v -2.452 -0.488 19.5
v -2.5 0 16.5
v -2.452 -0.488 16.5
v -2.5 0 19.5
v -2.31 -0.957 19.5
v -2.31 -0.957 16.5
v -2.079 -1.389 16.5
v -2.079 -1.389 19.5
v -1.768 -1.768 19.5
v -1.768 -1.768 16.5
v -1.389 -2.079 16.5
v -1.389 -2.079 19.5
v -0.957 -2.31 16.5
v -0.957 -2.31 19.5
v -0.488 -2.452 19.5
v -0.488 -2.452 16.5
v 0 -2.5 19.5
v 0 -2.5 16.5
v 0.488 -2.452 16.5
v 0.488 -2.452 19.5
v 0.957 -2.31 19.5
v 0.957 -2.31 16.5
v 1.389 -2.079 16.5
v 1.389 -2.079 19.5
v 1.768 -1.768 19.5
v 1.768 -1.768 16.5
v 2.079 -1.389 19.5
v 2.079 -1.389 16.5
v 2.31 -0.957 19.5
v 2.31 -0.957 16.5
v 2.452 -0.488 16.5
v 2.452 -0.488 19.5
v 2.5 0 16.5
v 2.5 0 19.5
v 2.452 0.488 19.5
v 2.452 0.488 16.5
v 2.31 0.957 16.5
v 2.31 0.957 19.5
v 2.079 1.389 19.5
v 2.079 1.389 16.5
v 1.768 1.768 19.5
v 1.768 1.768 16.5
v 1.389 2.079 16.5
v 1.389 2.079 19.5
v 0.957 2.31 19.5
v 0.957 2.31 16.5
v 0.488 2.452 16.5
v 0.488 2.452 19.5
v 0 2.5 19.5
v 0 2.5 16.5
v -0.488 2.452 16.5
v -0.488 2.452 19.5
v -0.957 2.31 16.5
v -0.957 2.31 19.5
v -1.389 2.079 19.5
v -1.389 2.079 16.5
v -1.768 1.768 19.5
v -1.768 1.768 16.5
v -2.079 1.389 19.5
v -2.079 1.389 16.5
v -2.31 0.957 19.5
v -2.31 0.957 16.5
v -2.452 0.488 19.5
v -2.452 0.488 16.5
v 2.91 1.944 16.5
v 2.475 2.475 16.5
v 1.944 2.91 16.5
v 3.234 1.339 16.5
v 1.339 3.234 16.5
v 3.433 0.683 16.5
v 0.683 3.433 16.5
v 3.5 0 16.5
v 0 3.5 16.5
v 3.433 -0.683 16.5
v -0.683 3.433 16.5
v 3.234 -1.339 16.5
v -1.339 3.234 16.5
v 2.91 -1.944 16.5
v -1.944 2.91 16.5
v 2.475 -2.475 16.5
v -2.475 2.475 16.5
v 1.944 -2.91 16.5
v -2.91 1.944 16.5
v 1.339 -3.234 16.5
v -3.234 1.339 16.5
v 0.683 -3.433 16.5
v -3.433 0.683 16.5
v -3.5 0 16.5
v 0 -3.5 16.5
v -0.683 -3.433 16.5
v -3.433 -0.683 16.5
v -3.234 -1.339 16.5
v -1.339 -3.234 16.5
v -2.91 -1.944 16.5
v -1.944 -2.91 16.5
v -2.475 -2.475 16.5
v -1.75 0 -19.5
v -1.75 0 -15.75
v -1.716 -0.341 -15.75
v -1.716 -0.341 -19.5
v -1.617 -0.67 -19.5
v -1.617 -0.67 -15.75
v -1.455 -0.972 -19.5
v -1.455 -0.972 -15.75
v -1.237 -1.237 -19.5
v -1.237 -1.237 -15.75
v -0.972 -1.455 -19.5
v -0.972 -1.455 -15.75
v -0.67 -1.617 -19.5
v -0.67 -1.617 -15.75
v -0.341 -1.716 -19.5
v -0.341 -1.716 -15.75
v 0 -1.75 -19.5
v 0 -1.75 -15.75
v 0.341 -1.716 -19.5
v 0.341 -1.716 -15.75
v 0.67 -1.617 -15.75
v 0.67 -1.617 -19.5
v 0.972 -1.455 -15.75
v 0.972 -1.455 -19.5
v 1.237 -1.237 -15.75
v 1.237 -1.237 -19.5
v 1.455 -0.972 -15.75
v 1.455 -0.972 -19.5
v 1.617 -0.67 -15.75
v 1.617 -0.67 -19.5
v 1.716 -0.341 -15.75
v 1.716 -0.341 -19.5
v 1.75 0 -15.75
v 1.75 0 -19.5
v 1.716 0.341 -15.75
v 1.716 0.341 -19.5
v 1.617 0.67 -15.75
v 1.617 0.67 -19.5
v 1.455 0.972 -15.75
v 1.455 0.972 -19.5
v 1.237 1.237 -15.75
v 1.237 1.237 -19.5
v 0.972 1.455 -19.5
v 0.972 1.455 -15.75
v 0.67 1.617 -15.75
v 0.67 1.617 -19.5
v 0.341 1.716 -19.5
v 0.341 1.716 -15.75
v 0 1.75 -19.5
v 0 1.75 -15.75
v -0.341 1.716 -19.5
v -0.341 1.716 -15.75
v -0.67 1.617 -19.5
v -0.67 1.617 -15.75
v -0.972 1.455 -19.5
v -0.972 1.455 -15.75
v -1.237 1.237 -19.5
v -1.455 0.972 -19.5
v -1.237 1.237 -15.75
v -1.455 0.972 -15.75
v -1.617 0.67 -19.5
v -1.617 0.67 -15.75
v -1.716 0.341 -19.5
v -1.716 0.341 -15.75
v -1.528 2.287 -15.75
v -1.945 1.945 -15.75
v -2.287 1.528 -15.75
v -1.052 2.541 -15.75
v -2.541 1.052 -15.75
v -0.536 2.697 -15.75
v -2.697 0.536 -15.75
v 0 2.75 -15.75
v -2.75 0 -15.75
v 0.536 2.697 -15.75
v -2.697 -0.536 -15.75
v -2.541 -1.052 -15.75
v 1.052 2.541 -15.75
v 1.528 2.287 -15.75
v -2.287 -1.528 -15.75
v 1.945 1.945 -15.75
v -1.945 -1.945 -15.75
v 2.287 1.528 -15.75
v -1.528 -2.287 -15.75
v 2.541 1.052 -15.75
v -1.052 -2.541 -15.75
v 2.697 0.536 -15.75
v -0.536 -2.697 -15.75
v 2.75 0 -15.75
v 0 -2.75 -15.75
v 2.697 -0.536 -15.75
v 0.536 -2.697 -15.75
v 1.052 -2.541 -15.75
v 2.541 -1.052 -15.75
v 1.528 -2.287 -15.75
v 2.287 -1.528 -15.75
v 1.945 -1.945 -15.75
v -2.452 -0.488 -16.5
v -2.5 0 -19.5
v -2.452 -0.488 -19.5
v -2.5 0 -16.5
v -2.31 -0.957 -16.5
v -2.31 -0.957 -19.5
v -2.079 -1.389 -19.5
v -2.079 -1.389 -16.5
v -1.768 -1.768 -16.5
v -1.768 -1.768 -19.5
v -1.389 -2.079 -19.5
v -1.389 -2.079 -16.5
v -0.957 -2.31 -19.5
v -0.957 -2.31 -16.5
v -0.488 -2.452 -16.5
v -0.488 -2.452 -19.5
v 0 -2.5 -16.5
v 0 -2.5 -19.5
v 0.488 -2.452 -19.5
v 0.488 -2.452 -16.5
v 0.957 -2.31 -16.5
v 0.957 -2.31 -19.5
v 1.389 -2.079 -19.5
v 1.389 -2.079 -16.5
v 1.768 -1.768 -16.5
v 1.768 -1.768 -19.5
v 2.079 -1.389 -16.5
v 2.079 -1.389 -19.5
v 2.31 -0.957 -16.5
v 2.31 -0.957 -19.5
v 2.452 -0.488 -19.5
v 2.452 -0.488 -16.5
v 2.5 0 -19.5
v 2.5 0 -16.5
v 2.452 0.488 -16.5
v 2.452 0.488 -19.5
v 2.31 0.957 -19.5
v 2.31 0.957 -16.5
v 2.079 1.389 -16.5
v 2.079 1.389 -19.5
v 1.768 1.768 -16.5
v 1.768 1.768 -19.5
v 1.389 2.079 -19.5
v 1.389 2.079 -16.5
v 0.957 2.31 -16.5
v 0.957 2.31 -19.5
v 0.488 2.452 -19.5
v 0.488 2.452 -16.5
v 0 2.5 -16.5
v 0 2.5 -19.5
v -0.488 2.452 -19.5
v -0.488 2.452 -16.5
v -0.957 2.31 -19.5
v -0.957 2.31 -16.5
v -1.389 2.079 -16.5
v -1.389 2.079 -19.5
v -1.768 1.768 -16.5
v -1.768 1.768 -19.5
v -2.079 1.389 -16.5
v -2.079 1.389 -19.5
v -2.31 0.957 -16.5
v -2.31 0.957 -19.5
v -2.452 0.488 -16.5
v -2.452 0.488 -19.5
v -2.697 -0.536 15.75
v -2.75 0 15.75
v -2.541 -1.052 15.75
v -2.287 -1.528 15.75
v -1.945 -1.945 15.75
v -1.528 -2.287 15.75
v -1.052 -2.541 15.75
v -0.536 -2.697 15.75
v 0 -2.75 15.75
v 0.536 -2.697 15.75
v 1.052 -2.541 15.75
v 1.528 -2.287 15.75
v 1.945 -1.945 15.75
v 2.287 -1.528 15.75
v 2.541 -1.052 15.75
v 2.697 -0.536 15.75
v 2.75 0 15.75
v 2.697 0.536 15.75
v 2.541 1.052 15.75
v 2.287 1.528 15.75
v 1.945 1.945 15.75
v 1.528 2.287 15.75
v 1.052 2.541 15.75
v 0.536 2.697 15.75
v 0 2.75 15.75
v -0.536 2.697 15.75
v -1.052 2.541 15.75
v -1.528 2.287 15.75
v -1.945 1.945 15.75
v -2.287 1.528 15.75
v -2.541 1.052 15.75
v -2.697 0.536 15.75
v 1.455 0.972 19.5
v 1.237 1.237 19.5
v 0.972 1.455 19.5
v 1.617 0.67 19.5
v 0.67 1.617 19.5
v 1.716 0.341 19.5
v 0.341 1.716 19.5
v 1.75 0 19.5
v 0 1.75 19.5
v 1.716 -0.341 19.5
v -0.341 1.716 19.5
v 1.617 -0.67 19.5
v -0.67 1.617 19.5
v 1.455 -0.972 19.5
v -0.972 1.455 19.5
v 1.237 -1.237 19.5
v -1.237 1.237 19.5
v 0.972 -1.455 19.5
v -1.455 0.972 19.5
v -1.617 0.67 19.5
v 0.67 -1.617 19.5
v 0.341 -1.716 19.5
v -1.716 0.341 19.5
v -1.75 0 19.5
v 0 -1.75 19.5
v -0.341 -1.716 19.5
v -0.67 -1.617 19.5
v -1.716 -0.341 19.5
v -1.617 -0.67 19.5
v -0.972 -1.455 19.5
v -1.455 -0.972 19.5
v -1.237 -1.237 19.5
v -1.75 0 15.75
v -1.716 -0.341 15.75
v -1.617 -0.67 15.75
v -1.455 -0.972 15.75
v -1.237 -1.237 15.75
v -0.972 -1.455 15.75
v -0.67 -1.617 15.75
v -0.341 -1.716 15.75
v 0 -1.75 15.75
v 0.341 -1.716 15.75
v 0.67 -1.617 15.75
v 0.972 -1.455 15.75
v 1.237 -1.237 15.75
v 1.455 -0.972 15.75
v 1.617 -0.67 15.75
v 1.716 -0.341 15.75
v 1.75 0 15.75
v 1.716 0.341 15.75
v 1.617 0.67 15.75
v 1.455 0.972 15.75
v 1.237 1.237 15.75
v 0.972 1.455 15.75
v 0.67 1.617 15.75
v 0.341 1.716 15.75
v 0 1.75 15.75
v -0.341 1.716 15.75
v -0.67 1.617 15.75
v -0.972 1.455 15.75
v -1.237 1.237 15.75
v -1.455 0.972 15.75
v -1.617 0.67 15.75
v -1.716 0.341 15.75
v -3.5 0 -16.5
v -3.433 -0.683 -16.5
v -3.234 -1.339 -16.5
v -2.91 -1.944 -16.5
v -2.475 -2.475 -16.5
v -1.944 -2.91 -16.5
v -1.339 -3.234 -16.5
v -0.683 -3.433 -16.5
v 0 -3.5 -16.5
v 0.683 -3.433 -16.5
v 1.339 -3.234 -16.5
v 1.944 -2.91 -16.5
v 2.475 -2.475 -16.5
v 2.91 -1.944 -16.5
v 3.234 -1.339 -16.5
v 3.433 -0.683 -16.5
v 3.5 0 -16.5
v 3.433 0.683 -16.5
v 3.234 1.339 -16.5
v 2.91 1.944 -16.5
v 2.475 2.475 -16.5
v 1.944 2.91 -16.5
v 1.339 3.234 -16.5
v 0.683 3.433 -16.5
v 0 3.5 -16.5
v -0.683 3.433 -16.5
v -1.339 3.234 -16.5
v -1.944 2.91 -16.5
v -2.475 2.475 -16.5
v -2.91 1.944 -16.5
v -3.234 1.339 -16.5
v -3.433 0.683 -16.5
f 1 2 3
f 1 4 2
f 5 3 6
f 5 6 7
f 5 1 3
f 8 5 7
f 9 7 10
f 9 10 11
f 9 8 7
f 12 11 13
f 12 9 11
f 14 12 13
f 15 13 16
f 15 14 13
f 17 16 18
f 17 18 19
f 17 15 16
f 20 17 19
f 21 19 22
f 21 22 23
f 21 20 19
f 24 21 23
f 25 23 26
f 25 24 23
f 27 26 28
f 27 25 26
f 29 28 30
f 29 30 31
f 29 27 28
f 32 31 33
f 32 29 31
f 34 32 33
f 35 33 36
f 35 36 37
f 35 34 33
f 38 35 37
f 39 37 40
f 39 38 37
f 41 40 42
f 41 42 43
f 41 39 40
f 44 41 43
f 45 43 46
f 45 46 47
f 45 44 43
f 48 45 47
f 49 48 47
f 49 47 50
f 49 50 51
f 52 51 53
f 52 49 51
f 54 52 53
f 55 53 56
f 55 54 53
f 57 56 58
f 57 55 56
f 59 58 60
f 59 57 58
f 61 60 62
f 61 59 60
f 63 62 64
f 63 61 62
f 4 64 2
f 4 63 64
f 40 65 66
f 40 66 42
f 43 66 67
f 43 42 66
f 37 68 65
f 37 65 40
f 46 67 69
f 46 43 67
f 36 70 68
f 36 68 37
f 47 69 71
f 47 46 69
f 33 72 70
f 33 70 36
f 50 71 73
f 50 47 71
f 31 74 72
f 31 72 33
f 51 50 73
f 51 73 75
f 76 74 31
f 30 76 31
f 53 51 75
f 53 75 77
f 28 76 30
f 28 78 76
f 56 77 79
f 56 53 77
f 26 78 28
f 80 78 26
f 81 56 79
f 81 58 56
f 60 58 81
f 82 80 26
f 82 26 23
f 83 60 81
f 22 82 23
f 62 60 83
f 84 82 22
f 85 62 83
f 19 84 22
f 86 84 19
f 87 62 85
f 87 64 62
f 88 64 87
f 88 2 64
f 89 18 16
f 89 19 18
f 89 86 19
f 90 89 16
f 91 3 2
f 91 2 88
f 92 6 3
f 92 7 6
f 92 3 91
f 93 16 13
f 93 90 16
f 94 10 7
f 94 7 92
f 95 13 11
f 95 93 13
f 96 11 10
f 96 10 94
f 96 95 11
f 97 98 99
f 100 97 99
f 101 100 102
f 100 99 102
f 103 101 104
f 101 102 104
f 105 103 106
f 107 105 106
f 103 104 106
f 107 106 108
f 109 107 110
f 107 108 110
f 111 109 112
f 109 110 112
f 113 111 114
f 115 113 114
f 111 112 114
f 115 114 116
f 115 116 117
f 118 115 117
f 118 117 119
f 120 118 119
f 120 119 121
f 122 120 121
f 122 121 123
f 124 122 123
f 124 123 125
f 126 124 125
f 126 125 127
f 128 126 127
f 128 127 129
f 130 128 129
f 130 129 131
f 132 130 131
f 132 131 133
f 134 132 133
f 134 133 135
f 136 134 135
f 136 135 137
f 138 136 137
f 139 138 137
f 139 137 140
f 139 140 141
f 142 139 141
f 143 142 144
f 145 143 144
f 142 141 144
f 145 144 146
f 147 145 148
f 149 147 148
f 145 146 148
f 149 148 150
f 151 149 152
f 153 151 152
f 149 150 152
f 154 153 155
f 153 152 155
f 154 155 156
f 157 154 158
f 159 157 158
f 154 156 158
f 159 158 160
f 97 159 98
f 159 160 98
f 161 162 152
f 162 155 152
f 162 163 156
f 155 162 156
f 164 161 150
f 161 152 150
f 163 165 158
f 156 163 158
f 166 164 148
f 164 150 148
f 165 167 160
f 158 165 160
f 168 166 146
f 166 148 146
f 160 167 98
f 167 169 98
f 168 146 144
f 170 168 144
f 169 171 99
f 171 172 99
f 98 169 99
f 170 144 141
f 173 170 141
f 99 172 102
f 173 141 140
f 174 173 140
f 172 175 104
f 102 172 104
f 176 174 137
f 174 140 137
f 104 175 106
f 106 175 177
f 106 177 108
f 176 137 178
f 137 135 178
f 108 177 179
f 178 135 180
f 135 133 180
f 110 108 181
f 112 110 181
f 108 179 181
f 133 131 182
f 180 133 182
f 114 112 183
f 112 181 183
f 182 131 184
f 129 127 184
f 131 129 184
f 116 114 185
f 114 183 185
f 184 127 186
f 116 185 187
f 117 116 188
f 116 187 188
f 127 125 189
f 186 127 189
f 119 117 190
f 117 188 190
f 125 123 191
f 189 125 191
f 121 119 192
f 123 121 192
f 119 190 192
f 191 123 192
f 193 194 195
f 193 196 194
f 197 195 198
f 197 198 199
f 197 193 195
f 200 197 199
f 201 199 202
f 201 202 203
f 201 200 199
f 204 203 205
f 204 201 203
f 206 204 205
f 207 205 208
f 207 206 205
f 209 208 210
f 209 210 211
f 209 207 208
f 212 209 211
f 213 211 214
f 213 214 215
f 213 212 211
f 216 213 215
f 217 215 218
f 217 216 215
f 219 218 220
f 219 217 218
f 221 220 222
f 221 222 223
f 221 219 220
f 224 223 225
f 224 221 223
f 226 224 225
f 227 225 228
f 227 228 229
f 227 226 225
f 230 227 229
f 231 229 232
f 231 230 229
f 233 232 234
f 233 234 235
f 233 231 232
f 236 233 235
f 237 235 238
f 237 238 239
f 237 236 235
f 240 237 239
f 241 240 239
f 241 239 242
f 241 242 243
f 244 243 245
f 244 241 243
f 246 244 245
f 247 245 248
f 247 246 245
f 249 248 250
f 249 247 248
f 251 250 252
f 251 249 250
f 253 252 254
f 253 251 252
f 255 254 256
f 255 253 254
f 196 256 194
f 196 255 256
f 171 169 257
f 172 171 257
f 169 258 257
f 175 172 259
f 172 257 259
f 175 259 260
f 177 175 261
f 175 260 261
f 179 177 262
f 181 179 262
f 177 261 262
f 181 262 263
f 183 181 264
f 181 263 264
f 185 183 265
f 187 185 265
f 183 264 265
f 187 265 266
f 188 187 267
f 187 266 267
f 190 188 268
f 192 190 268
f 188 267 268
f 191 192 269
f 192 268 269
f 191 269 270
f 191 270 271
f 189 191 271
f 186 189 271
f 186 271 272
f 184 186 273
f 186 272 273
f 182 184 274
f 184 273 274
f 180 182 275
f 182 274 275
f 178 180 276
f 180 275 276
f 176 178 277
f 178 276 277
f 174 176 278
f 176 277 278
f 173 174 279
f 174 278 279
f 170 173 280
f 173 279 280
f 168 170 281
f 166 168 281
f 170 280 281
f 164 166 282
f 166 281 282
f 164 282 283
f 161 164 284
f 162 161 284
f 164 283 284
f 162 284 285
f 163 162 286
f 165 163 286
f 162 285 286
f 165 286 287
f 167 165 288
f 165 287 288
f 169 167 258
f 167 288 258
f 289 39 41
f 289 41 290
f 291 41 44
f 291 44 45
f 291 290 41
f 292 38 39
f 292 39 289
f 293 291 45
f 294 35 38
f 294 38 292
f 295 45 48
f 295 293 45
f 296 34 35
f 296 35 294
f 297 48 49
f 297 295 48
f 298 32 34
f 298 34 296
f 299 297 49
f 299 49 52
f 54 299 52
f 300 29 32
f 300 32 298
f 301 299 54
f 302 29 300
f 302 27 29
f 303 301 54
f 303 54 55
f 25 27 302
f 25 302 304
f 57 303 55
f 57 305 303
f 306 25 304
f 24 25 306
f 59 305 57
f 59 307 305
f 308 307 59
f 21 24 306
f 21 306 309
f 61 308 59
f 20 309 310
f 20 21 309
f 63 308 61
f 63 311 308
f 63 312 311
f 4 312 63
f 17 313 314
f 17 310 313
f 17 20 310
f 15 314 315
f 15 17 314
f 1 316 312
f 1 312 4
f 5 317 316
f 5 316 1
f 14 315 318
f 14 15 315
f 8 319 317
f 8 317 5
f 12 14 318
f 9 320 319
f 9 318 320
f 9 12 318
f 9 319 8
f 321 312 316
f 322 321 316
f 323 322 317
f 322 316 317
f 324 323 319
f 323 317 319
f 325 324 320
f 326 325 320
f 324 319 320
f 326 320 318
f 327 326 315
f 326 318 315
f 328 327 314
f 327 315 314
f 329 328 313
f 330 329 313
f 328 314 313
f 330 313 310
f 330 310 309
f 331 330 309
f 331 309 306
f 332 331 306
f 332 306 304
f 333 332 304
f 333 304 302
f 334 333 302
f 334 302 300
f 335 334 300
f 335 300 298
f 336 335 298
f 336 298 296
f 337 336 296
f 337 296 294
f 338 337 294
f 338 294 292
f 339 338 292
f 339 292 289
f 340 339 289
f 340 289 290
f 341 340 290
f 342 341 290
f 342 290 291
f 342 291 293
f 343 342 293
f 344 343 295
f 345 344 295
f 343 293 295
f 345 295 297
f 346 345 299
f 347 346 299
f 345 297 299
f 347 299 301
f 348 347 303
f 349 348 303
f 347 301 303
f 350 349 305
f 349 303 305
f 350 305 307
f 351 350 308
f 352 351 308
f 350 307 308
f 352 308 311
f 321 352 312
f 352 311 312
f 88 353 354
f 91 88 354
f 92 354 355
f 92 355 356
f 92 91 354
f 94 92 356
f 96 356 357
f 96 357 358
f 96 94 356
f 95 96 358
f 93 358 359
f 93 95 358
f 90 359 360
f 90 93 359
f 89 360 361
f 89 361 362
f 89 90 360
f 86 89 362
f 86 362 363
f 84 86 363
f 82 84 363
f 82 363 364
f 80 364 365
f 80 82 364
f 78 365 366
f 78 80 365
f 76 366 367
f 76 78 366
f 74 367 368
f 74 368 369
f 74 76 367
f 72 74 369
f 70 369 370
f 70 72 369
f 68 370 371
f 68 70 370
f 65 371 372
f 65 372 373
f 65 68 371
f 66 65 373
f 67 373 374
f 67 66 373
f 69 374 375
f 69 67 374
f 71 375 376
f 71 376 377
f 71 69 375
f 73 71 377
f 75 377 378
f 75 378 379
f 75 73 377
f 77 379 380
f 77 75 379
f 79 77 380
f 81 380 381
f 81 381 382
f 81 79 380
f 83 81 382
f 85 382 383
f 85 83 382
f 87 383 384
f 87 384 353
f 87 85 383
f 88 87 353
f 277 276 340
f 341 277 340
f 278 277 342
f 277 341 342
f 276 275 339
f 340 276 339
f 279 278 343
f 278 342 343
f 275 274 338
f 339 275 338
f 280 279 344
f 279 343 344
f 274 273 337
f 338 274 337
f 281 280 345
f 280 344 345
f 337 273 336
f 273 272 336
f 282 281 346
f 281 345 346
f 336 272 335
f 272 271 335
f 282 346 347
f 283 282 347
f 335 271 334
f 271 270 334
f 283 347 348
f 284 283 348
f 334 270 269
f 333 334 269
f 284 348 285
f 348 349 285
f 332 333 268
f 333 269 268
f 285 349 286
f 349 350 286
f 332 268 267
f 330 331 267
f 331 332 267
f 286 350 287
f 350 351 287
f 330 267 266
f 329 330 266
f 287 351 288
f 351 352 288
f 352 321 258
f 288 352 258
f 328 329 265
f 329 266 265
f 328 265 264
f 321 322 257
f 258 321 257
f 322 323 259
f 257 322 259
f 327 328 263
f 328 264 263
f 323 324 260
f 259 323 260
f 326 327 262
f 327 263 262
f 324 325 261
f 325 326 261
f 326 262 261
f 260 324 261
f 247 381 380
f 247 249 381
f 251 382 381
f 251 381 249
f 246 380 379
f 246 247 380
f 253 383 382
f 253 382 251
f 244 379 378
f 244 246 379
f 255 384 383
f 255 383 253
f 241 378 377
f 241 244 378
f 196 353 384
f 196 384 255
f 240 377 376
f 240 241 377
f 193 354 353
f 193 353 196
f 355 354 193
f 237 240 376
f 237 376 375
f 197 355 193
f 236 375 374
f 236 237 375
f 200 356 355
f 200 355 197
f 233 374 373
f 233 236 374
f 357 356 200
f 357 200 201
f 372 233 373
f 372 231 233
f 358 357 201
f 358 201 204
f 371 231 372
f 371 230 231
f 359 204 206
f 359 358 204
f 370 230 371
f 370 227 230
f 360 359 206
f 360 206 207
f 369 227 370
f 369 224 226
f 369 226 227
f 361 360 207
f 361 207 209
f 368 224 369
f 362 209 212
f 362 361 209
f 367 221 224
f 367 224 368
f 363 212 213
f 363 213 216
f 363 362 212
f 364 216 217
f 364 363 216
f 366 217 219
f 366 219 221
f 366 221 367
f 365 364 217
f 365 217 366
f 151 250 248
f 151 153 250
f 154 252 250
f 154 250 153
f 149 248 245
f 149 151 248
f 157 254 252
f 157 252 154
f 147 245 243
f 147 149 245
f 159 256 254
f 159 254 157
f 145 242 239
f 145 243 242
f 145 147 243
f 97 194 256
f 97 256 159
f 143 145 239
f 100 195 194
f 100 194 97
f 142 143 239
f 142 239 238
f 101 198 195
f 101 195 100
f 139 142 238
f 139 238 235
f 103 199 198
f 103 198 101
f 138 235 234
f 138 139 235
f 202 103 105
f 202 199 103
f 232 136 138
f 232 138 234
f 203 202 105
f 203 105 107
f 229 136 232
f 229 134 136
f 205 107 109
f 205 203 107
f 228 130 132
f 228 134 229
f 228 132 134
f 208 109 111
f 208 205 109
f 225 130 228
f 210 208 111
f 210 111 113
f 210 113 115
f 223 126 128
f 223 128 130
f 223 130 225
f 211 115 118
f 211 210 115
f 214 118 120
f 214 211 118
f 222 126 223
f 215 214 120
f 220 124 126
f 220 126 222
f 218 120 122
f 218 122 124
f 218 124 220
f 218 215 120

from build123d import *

# Parameters (mm, degrees)
SHELL1_T = -0.75


with BuildPart() as part:
    # Sketch1 → Revolve1 (revolve)
    with BuildSketch(Plane(origin=(0, 0, 0), x_dir=(1, 0, 0), z_dir=(0, 1, 0)), mode=Mode.PRIVATE) as revolve1_sk:
        Polygon((3.5, 16.5), (3.5, -16.5), (2.5, -16.5), (2.5, -19.5), (0, -19.5), (0, -16.5), (0, 16.5), (0, 19.5), (2.5, 19.5), (2.5, 16.5), align=None)
    revolve(revolve1_sk.sketch.rotate(Axis((0, 0, -21.376645948), (0, 0, 1)), 180), axis=Axis((0, 0, -21.376645948), (0, 0, 1)))

    # Shell1
    shell1_openings = [part.faces().sort_by_distance(p)[0] for p in [
        (0, 0, -19.5),
        (0, 0, 19.5),
    ]]
    offset(amount=SHELL1_T, openings=shell1_openings, kind=Kind.INTERSECTION)


solid = part.part
